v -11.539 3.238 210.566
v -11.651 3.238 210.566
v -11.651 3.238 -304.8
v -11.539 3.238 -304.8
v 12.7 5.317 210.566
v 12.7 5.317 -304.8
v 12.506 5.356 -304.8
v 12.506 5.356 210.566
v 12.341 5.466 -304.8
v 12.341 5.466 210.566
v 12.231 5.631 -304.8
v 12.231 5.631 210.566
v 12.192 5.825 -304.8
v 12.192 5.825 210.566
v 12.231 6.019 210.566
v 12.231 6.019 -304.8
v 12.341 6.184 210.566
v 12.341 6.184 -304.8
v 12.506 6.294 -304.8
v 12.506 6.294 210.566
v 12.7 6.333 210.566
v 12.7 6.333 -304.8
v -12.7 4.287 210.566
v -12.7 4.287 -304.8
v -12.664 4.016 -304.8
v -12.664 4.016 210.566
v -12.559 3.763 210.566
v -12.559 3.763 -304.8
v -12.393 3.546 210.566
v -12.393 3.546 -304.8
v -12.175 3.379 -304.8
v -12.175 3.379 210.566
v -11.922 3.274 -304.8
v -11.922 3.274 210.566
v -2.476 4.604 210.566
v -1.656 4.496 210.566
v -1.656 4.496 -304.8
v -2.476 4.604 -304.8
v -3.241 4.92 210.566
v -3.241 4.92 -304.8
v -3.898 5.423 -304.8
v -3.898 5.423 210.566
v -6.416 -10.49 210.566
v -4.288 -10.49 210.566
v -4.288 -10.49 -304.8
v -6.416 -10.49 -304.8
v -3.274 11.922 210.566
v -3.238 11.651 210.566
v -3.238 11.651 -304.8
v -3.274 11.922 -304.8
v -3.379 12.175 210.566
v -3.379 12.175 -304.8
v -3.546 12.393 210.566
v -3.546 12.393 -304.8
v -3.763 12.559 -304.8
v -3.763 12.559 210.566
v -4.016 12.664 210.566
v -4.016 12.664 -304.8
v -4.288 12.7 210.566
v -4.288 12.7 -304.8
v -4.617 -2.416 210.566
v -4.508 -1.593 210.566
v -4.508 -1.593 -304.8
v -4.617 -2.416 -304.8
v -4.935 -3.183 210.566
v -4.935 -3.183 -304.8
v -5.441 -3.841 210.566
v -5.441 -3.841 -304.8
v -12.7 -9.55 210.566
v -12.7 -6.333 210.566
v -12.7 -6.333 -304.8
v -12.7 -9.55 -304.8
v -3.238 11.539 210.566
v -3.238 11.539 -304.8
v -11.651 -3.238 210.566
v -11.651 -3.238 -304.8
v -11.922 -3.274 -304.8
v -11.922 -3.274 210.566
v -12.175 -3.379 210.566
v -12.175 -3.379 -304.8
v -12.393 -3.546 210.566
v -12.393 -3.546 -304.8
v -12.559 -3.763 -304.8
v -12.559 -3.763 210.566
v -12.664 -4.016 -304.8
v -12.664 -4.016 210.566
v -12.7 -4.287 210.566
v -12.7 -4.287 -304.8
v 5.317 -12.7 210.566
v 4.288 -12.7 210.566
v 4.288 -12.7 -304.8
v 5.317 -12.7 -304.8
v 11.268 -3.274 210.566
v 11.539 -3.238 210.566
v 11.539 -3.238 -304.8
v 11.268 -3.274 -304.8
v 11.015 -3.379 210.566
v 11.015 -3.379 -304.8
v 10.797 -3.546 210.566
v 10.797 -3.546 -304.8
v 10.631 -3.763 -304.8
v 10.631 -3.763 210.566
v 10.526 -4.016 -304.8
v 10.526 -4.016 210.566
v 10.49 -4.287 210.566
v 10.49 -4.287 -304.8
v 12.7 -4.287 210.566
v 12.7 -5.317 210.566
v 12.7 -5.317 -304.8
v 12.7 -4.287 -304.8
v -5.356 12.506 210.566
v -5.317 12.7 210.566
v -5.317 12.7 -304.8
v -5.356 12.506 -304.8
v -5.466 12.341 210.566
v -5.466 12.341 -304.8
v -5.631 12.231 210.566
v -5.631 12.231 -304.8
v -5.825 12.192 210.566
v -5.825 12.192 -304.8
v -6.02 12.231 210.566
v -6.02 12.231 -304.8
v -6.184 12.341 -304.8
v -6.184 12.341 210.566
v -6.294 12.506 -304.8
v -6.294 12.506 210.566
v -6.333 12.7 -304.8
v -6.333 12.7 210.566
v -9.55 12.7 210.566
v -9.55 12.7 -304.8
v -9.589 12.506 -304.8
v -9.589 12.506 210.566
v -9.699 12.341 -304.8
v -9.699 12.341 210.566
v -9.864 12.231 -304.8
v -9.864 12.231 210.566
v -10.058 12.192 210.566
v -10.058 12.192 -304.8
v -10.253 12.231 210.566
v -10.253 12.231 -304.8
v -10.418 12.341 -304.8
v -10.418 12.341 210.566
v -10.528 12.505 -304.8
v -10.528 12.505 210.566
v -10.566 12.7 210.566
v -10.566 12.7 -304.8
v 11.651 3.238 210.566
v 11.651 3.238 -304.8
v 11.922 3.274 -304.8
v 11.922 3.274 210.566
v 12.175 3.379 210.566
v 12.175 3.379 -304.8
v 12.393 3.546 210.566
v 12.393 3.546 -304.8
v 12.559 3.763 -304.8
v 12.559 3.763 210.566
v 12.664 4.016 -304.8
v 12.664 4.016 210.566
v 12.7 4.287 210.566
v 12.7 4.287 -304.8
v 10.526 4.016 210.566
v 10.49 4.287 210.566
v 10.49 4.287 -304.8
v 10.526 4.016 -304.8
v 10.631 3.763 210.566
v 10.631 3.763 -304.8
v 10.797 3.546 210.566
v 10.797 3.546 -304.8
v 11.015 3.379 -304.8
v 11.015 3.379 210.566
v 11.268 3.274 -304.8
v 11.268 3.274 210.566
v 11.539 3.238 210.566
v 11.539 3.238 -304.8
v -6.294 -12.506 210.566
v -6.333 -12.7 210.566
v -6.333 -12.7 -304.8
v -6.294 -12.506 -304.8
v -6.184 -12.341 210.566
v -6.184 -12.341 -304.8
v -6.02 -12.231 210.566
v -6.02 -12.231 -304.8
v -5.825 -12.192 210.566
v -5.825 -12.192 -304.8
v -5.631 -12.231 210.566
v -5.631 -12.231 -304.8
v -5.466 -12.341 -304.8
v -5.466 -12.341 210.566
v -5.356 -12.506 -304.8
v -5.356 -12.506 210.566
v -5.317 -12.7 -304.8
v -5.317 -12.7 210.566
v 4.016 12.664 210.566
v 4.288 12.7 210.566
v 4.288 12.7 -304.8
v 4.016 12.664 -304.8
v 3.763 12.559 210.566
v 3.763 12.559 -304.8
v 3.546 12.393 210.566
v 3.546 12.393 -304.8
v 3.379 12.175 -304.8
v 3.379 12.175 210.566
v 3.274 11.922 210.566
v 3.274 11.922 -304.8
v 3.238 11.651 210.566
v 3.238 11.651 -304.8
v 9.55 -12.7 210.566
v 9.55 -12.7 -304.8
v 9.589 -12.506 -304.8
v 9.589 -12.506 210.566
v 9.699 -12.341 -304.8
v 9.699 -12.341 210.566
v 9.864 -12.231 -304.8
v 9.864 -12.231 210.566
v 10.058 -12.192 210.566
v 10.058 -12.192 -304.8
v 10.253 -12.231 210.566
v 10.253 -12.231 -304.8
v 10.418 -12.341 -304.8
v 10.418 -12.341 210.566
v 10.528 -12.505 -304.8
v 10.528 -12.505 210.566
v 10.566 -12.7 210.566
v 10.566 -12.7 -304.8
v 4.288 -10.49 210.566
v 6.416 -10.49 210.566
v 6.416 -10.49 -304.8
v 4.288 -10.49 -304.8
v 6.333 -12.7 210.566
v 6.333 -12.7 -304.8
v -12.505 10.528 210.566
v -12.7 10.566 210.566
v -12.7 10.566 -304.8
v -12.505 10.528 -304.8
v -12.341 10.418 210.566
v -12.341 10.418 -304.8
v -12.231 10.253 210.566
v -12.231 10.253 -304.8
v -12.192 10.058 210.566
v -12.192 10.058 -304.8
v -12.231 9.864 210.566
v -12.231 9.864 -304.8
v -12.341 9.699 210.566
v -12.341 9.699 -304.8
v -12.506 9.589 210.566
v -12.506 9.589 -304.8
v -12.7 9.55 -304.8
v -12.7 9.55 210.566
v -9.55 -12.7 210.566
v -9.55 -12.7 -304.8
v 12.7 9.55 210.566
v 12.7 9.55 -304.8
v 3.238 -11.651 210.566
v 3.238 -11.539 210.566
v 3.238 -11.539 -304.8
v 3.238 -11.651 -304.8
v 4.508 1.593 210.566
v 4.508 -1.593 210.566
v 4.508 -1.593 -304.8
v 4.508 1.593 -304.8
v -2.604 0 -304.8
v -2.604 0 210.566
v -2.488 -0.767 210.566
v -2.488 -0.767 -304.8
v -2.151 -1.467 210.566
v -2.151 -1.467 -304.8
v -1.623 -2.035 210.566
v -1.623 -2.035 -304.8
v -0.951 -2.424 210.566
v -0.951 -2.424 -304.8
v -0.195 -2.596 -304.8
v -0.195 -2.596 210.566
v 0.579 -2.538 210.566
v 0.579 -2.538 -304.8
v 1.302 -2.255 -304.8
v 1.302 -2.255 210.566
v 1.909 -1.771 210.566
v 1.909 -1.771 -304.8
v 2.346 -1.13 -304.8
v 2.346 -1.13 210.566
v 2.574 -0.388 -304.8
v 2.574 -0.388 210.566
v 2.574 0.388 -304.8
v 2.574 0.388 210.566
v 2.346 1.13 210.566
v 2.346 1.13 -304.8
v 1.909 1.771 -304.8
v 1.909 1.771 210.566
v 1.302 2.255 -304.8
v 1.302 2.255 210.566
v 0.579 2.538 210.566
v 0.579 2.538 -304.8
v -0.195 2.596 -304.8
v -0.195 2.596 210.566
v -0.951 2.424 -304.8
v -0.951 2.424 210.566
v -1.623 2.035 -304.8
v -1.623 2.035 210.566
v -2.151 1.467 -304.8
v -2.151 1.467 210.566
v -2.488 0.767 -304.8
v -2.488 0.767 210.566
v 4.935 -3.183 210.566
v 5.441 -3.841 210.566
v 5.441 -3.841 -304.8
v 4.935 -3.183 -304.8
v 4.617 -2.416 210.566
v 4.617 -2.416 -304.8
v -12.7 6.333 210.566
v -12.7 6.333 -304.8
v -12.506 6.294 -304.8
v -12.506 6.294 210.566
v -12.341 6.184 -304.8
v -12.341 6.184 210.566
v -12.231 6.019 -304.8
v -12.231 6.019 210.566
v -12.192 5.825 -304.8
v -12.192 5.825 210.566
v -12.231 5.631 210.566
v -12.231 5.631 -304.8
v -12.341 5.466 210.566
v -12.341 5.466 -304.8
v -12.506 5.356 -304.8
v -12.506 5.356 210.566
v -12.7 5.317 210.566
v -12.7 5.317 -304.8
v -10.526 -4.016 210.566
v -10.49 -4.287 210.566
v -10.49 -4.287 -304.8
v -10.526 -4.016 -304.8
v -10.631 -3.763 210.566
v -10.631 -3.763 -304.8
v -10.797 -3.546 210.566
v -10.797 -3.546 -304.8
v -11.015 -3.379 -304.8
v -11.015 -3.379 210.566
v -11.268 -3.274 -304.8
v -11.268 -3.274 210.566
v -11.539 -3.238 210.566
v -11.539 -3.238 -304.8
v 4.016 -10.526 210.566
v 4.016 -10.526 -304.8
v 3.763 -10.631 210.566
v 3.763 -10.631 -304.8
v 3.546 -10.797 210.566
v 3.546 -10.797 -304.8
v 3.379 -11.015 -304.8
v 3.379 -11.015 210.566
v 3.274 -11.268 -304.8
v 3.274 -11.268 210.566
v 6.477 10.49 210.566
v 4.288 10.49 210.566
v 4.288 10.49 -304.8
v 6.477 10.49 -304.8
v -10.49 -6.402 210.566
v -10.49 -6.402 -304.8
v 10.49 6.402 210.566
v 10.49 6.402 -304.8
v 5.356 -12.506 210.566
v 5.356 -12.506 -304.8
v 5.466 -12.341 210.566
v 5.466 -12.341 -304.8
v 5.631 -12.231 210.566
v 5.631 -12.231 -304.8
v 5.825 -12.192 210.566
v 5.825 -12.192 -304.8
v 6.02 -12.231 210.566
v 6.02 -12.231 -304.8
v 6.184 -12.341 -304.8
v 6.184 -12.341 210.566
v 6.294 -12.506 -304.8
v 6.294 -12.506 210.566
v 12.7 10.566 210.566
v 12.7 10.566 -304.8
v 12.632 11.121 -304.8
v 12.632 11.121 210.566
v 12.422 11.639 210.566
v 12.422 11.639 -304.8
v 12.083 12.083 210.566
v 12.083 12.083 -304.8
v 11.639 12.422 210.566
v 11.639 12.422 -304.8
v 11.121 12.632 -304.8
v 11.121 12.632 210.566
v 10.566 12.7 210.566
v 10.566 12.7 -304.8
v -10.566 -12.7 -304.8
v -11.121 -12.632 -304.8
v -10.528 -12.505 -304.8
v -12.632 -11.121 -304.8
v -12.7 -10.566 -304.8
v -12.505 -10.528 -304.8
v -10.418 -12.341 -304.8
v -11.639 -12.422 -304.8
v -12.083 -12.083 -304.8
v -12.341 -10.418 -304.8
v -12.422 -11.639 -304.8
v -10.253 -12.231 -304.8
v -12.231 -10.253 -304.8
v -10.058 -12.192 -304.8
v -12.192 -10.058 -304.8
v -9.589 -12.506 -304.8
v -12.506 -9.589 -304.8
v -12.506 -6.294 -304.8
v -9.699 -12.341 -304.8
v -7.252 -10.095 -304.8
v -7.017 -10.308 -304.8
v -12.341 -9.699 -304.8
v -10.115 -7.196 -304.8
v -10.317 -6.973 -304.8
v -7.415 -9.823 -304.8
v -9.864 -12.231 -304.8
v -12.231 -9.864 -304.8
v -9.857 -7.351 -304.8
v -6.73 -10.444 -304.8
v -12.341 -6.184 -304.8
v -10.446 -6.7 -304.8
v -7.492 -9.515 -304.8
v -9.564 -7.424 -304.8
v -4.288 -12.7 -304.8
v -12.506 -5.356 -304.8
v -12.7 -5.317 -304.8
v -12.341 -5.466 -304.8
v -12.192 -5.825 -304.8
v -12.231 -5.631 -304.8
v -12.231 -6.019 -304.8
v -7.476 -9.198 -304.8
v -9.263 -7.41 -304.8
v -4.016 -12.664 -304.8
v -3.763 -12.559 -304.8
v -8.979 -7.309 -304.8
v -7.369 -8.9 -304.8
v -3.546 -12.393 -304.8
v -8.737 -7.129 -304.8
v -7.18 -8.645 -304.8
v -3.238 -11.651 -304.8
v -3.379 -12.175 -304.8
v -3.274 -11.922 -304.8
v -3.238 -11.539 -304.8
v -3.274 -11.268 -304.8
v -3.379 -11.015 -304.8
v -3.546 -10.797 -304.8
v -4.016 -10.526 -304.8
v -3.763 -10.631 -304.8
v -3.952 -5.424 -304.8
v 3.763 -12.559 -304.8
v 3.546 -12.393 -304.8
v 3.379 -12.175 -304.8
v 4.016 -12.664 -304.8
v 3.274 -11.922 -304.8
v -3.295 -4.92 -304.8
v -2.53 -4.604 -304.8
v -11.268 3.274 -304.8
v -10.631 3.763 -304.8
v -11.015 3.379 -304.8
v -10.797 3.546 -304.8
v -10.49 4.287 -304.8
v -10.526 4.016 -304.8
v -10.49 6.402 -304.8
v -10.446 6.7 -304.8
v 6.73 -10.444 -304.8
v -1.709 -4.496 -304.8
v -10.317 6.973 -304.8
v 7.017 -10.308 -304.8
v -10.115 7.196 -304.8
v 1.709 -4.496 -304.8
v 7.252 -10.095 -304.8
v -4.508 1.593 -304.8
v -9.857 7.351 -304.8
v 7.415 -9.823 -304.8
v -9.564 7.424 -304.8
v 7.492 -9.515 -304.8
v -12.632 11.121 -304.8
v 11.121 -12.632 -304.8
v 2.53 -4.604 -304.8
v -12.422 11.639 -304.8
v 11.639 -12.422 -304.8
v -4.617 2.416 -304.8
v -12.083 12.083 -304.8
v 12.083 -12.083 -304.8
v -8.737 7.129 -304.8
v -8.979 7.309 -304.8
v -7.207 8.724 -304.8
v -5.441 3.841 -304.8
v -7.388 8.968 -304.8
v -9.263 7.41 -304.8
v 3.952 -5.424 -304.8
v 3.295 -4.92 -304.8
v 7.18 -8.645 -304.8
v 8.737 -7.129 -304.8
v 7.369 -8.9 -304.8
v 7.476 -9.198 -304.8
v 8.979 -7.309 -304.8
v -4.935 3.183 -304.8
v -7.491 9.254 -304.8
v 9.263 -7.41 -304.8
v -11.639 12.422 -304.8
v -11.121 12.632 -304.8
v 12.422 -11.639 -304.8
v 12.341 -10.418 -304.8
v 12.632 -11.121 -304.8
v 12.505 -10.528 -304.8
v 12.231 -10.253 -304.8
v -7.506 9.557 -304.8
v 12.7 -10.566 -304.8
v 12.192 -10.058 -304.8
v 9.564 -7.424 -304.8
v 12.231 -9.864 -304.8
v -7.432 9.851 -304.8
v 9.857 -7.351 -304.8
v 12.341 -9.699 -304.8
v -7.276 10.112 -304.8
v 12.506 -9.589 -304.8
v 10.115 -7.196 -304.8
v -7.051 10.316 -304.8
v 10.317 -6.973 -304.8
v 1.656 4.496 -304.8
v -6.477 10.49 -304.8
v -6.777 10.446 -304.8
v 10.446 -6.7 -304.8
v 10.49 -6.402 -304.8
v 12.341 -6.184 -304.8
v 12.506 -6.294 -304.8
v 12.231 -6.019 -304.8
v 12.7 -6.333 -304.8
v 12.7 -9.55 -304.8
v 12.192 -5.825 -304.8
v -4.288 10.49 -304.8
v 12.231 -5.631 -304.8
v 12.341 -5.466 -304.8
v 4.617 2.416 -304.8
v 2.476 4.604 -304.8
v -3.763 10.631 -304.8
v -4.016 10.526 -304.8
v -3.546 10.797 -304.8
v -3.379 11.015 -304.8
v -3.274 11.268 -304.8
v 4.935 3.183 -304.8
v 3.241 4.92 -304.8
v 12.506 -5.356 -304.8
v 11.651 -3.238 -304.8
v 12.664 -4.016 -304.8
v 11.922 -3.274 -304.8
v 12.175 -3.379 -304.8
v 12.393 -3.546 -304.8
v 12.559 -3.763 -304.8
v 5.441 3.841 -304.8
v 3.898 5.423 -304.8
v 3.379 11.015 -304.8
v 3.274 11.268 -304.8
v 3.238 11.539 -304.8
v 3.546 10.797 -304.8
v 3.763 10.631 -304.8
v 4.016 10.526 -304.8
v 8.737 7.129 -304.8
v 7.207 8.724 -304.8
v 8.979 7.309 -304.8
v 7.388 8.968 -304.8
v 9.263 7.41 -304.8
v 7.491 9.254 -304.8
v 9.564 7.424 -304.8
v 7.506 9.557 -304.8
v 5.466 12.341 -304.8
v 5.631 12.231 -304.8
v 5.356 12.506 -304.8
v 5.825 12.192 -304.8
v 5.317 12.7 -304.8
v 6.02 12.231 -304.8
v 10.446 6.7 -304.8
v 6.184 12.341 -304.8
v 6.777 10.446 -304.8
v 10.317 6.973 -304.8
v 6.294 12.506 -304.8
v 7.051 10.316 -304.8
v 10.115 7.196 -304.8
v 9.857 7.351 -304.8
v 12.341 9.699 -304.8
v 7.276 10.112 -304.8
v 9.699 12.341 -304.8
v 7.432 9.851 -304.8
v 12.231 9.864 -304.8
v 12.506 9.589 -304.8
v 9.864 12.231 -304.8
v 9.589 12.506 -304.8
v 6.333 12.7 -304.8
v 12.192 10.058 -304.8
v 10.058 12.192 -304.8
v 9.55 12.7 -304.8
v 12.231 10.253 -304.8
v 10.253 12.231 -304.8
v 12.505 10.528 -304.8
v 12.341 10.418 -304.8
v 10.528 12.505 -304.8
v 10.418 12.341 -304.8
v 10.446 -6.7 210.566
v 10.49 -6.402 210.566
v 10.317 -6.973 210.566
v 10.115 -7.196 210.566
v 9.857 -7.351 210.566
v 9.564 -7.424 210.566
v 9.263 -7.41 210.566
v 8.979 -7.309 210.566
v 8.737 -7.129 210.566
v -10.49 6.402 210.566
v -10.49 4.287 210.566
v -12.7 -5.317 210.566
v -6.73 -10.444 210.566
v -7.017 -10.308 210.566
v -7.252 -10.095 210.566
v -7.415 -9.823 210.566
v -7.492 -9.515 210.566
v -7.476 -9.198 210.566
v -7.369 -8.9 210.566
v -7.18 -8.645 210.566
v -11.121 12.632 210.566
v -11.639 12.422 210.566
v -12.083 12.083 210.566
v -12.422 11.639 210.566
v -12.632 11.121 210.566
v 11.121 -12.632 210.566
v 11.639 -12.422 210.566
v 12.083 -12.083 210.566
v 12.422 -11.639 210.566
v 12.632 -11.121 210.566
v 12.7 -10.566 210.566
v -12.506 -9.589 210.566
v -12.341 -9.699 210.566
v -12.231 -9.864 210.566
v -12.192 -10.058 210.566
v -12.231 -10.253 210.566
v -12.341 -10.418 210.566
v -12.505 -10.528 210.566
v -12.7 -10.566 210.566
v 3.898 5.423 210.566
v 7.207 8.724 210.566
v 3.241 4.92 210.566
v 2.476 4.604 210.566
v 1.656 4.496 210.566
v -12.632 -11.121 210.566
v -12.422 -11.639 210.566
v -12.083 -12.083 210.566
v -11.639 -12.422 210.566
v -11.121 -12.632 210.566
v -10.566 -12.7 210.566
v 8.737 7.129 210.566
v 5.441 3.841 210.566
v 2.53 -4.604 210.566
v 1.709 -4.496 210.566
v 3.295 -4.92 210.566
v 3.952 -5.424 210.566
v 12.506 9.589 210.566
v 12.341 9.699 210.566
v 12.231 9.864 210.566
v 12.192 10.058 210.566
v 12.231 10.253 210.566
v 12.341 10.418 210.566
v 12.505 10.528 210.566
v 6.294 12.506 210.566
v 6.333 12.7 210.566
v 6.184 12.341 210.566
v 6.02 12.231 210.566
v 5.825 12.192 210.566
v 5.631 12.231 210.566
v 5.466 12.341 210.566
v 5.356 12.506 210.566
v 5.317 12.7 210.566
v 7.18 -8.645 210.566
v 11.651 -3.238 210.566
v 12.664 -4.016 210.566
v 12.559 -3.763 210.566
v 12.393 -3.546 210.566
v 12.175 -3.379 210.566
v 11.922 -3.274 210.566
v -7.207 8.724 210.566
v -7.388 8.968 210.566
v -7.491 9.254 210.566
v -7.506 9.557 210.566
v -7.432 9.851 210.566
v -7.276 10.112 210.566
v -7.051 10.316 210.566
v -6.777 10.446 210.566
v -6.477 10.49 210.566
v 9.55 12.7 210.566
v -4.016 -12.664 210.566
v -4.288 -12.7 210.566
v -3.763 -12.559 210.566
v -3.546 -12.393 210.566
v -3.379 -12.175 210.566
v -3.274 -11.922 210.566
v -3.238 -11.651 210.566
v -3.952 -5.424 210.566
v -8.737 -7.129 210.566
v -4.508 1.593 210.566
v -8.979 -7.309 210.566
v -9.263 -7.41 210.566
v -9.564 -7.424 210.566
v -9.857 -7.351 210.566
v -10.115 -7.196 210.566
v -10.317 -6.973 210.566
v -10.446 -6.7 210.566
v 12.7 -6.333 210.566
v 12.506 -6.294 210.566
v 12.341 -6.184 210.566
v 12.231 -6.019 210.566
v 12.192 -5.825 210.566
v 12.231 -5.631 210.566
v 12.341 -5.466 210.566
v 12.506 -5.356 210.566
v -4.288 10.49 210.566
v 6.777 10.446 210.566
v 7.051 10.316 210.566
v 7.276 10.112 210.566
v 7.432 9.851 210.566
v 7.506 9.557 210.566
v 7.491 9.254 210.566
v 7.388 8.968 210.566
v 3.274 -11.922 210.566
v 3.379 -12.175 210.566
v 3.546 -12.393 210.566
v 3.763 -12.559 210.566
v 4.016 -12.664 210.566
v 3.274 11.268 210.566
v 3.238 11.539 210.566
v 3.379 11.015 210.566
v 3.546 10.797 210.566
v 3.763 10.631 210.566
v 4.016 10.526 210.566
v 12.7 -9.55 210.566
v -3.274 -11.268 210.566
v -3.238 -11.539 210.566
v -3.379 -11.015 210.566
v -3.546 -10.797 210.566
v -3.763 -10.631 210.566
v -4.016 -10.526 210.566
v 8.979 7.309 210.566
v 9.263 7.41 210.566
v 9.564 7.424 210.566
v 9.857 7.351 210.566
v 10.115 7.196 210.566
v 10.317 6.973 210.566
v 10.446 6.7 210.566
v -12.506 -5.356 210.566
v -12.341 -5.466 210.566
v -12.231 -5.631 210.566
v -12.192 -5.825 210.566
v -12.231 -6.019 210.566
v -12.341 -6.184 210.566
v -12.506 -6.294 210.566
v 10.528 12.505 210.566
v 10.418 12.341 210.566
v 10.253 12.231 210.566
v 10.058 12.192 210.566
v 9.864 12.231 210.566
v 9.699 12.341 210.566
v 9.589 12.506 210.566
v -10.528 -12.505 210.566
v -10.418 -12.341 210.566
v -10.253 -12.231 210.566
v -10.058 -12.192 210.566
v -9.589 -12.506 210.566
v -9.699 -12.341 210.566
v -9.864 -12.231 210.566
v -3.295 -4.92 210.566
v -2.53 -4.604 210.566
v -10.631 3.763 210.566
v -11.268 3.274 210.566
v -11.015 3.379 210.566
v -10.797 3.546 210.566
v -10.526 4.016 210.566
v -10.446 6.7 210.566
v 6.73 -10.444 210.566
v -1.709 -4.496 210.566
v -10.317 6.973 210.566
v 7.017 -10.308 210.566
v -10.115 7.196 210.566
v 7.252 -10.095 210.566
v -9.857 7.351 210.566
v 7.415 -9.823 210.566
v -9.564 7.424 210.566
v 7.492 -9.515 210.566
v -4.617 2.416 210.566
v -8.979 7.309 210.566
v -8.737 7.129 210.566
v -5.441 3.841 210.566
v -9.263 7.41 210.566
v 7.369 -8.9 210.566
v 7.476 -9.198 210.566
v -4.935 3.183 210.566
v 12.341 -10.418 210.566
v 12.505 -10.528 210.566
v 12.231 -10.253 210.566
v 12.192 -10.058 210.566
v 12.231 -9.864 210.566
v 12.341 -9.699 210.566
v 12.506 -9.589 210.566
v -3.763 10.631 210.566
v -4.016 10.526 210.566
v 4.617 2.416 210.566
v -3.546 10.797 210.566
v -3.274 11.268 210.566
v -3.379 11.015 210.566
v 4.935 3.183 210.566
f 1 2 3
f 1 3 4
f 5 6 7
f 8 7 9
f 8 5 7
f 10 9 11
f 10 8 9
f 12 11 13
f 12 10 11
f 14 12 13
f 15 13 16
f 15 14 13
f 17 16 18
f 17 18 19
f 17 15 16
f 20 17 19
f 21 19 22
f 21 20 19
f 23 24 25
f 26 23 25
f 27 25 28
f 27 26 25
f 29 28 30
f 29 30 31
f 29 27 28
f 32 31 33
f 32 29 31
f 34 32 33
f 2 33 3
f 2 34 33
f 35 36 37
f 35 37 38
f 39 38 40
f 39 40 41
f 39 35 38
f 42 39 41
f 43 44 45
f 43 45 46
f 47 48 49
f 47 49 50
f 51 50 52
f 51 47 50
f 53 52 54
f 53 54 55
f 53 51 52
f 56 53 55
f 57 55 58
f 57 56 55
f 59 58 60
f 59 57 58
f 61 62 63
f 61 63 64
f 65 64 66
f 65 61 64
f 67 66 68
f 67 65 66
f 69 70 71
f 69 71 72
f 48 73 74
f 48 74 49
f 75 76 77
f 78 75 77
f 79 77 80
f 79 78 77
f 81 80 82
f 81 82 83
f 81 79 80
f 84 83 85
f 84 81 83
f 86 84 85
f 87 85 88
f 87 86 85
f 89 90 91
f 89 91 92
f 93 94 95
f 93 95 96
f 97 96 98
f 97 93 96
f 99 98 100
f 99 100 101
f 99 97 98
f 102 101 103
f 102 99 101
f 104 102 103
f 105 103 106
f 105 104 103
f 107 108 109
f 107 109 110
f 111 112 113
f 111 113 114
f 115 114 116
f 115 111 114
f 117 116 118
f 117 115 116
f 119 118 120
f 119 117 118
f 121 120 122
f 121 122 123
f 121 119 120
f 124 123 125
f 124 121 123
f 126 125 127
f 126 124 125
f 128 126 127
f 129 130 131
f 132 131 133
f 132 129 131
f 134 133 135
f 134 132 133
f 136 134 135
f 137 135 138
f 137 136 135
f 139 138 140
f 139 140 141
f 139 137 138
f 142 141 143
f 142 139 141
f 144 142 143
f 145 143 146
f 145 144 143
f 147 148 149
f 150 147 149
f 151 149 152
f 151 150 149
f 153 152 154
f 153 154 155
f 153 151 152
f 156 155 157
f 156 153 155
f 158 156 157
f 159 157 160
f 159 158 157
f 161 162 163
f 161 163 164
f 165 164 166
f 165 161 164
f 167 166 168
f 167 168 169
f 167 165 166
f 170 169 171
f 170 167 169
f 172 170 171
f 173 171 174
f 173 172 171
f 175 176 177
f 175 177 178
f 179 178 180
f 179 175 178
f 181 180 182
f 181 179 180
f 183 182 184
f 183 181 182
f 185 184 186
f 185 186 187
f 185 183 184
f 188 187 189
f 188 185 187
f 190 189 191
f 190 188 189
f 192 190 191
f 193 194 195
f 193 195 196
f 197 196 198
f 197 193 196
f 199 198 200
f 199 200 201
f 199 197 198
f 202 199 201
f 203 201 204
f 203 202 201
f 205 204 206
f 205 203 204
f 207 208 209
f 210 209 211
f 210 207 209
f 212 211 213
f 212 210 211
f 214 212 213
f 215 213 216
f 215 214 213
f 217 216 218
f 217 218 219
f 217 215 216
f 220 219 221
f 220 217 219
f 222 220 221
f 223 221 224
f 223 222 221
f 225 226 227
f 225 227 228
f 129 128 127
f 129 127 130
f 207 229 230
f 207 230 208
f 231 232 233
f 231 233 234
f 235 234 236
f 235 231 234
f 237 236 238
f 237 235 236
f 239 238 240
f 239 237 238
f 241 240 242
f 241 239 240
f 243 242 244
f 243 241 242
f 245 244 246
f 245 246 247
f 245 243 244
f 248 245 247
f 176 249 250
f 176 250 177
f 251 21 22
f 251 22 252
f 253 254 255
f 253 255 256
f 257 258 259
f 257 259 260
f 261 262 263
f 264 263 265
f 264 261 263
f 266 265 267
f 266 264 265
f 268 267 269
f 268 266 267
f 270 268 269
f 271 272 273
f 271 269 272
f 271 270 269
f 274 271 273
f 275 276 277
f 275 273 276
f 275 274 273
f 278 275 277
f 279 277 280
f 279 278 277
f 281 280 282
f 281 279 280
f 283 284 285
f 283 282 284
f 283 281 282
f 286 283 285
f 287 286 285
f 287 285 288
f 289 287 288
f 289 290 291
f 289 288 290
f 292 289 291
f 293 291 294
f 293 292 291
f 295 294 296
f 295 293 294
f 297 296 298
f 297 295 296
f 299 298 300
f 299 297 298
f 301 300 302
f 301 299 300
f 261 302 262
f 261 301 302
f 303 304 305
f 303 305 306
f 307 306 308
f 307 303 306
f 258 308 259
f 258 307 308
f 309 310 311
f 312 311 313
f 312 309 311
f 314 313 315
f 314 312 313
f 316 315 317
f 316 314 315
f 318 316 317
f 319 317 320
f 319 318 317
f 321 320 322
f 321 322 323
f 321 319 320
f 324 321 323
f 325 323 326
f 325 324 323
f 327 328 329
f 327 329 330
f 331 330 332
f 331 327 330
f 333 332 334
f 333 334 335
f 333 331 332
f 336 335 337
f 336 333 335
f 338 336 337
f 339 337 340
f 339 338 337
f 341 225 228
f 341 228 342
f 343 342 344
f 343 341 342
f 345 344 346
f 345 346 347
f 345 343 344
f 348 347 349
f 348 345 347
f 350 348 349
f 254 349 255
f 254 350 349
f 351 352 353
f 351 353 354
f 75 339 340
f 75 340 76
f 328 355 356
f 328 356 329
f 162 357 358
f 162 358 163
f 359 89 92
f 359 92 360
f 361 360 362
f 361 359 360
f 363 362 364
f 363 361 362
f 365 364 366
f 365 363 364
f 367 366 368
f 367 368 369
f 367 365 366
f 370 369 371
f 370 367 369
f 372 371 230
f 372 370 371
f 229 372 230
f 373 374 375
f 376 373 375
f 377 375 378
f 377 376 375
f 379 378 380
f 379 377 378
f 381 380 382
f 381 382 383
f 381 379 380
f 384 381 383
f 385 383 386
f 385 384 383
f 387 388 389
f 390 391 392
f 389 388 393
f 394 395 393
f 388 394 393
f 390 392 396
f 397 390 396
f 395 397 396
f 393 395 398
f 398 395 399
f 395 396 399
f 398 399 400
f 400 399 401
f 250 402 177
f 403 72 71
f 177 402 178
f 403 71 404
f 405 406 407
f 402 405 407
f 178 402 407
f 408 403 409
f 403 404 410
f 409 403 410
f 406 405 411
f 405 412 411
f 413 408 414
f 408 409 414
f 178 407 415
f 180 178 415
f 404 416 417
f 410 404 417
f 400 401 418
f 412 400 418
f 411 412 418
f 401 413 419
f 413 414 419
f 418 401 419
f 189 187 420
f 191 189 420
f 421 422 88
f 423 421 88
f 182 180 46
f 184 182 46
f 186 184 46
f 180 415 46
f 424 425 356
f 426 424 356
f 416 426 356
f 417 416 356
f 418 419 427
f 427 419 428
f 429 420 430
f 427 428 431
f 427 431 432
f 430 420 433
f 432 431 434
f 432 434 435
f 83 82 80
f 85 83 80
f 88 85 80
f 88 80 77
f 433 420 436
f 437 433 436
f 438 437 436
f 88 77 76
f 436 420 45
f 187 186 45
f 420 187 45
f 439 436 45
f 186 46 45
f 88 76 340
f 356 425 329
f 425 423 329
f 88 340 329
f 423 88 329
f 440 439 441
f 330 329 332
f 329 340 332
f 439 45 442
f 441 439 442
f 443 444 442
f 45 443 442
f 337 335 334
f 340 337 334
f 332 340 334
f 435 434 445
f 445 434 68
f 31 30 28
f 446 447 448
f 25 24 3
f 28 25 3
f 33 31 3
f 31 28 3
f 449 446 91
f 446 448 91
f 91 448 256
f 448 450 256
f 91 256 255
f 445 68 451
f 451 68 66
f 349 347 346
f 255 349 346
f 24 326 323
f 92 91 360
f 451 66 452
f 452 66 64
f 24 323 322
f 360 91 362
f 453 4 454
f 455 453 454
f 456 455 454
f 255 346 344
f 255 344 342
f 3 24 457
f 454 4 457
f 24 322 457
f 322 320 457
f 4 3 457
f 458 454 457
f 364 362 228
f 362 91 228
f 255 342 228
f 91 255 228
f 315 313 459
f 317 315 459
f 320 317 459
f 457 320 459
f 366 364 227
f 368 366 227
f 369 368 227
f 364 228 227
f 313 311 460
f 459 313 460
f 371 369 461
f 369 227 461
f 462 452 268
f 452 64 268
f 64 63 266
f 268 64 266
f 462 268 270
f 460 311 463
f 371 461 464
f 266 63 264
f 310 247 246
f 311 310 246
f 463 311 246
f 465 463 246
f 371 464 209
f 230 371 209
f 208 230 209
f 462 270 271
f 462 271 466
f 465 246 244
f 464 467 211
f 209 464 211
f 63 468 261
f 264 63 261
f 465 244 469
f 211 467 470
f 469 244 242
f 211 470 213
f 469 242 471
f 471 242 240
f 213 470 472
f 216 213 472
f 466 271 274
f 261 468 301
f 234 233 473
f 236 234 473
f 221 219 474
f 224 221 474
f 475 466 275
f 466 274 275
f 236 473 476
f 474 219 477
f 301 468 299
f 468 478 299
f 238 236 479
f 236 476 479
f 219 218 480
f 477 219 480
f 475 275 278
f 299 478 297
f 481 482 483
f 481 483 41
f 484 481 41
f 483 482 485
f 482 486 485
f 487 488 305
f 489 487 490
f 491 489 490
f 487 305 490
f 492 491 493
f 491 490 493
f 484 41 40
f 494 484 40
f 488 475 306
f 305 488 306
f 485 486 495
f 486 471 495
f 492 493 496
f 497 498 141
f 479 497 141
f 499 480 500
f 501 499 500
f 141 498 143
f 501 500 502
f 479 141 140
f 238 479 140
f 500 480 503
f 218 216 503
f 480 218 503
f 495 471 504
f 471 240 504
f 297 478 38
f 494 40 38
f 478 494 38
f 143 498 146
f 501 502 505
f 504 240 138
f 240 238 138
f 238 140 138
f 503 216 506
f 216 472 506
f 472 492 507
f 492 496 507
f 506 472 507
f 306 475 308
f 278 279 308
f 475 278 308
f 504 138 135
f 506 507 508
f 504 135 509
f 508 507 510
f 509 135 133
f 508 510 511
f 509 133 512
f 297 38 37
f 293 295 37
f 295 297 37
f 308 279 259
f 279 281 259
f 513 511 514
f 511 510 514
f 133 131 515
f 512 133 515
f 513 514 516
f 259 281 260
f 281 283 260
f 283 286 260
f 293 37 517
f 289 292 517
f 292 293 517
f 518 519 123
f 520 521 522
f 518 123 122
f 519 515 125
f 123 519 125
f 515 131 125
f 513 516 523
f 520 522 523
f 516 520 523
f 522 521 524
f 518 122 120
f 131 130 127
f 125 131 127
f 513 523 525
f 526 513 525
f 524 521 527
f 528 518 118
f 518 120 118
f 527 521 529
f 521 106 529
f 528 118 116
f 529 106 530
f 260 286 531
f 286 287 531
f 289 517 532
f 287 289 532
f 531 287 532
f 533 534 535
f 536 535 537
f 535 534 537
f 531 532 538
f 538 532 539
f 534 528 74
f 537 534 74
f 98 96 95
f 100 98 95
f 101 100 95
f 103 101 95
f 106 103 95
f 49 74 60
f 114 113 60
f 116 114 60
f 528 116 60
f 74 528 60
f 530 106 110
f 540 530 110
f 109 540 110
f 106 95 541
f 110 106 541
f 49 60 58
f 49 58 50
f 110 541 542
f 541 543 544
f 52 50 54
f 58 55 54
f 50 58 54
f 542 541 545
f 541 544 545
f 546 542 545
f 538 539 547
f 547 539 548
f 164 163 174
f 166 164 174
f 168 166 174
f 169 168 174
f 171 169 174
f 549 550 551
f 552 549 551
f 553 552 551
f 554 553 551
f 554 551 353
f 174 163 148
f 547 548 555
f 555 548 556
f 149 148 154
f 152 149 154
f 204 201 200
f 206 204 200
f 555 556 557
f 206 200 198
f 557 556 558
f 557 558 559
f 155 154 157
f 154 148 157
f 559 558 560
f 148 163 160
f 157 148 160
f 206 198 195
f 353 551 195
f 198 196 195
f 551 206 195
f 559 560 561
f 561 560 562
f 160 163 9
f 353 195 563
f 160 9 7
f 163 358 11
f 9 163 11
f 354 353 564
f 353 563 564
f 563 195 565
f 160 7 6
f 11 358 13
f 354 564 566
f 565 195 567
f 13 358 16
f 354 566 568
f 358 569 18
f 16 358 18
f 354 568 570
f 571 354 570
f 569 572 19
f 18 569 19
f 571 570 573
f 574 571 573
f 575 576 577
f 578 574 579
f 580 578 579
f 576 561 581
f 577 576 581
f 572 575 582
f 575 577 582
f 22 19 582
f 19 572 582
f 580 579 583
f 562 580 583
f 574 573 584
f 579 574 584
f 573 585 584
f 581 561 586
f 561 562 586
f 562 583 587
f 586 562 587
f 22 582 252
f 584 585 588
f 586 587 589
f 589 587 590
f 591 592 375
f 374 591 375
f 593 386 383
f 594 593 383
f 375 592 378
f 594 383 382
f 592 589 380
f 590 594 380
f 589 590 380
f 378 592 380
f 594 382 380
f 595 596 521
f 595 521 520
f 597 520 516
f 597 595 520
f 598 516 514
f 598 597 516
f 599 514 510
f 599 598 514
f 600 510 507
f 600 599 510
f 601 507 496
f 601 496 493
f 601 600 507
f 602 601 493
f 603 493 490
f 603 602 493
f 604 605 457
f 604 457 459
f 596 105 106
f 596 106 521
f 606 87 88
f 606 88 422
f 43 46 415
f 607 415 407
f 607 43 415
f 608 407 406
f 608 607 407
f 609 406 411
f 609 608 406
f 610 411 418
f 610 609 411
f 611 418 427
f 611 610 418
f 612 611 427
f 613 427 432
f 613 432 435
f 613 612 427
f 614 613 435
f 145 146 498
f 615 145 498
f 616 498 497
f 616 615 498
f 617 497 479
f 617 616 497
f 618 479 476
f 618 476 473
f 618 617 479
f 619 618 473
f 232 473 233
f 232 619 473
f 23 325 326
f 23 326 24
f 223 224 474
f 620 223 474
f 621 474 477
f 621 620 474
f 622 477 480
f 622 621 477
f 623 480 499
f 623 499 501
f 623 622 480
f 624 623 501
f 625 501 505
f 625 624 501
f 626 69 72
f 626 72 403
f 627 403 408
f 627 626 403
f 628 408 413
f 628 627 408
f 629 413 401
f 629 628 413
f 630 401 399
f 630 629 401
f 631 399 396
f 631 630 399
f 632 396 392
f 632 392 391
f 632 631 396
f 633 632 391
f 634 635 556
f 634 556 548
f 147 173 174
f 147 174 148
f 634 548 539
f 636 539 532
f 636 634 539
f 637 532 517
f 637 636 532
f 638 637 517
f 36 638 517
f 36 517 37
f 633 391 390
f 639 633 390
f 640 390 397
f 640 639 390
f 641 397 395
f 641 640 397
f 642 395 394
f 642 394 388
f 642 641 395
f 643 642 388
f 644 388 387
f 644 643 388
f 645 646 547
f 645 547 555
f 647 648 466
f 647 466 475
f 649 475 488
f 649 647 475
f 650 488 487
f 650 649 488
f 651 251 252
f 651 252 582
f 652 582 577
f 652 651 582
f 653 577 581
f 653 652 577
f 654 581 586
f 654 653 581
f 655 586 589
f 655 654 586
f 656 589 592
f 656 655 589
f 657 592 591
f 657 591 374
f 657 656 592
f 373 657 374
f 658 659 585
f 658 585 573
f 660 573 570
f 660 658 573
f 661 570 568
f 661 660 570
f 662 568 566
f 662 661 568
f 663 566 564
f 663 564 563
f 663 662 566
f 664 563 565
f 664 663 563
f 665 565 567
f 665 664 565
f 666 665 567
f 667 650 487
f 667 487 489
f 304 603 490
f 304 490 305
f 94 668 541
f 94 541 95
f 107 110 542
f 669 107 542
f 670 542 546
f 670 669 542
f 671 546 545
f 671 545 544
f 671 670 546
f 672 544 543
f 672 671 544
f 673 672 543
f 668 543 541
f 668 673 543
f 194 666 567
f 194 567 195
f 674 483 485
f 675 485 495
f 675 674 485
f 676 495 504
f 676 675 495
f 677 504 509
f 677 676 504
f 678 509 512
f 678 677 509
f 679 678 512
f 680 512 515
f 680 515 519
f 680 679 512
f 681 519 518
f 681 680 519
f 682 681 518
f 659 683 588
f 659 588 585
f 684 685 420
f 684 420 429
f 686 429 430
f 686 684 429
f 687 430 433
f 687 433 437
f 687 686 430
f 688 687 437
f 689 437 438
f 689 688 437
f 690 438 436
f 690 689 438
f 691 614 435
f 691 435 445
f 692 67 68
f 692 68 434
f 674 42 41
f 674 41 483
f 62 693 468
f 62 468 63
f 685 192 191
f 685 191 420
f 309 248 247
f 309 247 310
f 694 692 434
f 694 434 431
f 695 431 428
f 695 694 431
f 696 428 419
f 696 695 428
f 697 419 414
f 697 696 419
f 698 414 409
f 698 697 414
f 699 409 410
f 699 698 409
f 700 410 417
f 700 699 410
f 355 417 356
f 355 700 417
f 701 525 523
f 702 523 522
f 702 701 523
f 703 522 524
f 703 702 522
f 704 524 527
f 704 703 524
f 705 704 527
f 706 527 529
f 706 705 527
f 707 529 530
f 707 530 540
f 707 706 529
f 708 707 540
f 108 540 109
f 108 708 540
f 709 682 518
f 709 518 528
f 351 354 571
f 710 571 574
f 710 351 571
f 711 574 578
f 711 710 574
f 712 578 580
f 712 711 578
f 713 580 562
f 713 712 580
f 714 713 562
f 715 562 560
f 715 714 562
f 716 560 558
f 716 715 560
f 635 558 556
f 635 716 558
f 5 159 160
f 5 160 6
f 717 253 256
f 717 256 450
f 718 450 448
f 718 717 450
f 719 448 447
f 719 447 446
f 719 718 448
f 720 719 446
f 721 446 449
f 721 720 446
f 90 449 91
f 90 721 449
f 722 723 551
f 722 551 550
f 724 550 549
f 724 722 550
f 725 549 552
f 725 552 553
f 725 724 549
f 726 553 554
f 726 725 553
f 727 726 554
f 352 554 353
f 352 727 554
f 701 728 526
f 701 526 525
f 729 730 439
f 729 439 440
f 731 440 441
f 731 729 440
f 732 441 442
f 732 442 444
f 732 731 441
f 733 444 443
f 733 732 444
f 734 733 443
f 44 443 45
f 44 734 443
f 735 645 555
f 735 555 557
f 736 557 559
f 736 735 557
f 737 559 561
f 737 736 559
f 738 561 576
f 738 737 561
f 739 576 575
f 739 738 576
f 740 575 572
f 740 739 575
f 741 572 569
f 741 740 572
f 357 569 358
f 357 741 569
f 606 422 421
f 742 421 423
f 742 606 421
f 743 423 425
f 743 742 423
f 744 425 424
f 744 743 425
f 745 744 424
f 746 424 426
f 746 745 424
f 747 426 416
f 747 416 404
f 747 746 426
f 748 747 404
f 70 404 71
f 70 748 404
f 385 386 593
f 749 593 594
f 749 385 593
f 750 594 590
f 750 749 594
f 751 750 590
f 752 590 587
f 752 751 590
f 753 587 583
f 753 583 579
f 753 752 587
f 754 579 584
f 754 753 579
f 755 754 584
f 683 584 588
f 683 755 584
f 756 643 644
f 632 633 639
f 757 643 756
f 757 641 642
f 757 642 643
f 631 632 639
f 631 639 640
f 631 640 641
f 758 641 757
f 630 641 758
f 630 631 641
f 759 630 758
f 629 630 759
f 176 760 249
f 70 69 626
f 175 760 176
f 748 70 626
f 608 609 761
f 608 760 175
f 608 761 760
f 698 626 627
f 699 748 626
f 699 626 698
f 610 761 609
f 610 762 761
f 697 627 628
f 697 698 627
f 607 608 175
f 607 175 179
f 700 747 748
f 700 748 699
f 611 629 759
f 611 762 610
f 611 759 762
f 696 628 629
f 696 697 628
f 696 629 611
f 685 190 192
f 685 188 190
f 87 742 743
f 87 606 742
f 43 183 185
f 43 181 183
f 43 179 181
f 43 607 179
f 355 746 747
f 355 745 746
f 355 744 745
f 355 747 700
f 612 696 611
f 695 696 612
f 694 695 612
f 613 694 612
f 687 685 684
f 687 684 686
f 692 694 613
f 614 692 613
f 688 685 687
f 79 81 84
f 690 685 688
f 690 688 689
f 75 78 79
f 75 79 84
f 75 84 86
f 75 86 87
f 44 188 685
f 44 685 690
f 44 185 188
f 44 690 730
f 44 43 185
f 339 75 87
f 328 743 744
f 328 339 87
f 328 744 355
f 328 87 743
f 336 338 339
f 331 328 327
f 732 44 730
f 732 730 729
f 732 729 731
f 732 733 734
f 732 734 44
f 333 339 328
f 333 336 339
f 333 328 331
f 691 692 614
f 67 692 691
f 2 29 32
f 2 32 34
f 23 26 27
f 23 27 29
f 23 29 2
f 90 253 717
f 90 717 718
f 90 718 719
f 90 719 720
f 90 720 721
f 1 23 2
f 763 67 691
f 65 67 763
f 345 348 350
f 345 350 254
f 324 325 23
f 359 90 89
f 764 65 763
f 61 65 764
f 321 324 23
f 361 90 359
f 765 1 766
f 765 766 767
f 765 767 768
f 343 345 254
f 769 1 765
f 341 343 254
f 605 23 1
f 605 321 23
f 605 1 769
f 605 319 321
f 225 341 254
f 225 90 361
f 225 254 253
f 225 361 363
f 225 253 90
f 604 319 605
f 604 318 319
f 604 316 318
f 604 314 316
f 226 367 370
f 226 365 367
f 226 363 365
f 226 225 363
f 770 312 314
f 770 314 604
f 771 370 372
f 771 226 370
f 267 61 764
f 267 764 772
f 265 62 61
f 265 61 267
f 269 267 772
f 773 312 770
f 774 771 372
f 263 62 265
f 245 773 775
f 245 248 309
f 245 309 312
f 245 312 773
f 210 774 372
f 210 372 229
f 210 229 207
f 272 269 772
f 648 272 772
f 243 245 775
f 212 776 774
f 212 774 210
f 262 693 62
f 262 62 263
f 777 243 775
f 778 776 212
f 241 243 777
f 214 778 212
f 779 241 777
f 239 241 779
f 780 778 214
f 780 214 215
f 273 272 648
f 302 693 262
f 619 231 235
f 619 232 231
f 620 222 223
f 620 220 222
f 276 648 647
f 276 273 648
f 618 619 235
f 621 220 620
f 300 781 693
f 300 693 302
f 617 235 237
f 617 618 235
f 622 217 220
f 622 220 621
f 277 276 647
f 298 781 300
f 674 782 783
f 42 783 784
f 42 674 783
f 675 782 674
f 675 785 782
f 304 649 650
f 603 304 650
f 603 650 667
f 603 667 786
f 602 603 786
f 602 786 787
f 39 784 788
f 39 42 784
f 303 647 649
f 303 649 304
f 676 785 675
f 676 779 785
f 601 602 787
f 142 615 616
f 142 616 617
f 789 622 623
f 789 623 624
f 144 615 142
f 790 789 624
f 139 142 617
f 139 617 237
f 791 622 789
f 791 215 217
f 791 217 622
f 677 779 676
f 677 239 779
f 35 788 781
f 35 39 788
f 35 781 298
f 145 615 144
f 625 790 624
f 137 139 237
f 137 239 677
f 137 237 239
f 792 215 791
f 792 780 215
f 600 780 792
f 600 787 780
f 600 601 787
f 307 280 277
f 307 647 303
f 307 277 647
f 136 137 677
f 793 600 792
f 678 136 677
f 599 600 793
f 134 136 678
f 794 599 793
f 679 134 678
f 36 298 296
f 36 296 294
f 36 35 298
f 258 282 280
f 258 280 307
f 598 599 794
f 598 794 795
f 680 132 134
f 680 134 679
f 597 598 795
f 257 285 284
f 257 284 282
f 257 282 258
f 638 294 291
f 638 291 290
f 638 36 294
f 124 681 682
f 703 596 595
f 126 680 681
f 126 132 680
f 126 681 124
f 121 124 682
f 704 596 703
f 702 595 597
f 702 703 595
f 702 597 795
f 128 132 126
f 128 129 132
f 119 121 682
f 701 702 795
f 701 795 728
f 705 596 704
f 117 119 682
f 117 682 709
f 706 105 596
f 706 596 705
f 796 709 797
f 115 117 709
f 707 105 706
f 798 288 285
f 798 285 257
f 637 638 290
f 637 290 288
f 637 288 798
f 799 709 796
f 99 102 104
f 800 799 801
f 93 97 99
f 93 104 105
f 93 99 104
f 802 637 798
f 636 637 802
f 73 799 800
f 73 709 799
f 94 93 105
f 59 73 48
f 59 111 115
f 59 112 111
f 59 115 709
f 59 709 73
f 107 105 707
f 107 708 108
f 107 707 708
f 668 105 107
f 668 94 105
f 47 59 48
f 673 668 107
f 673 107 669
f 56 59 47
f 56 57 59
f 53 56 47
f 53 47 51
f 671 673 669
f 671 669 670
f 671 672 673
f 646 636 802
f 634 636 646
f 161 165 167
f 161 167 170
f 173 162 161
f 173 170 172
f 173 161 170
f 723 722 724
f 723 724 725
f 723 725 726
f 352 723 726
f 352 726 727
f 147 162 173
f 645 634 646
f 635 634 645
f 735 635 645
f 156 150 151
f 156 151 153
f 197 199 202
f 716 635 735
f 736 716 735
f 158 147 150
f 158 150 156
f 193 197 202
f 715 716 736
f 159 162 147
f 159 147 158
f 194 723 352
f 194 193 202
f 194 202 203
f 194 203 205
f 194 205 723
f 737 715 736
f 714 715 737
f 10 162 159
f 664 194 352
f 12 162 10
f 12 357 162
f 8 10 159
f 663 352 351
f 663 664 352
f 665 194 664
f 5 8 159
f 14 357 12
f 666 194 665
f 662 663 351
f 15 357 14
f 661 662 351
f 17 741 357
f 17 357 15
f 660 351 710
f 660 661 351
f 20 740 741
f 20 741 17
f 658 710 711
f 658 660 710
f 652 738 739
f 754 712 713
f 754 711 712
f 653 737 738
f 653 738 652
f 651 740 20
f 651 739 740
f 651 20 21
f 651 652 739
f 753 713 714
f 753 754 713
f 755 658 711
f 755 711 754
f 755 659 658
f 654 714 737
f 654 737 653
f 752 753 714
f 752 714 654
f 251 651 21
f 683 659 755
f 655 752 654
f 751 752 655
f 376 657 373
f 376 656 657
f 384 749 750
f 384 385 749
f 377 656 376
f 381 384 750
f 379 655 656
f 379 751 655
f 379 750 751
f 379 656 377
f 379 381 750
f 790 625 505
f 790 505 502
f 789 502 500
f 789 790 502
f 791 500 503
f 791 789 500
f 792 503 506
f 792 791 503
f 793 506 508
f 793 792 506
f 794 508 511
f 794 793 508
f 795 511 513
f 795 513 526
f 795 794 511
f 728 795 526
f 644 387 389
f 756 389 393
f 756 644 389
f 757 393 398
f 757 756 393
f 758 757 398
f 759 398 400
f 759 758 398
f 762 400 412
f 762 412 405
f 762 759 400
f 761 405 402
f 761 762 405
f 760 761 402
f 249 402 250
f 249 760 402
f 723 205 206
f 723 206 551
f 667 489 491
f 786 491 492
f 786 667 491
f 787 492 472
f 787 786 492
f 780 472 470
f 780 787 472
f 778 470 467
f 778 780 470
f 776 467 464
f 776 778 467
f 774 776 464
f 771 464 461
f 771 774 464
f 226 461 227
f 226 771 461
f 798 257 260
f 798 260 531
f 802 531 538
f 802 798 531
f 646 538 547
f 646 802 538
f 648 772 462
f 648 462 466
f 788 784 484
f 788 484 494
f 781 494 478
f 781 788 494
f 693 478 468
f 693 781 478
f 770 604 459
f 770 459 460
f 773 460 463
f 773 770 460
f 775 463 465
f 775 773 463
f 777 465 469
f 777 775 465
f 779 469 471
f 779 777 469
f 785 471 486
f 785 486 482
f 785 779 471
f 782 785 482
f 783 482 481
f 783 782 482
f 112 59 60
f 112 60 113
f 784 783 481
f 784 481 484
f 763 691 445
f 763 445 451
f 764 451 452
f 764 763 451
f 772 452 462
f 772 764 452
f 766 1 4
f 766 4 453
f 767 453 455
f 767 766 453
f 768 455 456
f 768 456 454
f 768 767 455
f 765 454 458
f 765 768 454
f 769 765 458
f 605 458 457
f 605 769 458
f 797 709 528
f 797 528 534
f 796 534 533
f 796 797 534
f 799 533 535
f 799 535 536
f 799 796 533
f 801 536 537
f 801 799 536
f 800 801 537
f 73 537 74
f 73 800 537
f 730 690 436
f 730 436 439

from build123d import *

# Parameters (mm, degrees)
SKETCH1_R           = 2.6035
BOSS_EXTRUDE1_DEPTH = 304.8
SKETCH2_W           = 31.141643918
SKETCH2_H           = 31.372180197
CUT_EXTRUDE1_DEPTH  = 94.234


with BuildPart() as part:
    # Sketch1 → Boss-Extrude1 (new, symmetric)
    with BuildSketch(Plane.XY):
        with BuildLine():
            Line((-7.179650497, -8.645192506), (-3.952270251, -5.423690499))
            ThreePointArc((-3.952270251, -5.423690499), (-2.922936451, -4.736929036), (-1.709253557, -4.4958))
            Line((-1.709253557, -4.4958), (1.709253557, -4.4958))
            ThreePointArc((1.709253557, -4.4958), (2.922936451, -4.736929036), (3.952270251, -5.423690499))
            Line((3.952270251, -5.423690499), (7.179650497, -8.645192506))
            ThreePointArc((7.179650497, -8.645192506), (7.41473083, -9.822813117), (6.416408329, -10.4902))
            Line((6.416408329, -10.4902), (4.287512407, -10.4902))
            ThreePointArc((4.287512407, -10.4902), (3.54574862, -10.79744862), (3.2385, -11.539212407))
            Line((3.2385, -11.539212407), (3.2385, -11.650987593))
            ThreePointArc((3.2385, -11.650987593), (3.54574862, -12.39275138), (4.287512407, -12.7))
            Line((4.287512407, -12.7), (5.317126718, -12.7))
            ThreePointArc((5.317126718, -12.7), (5.825126718, -12.192), (6.333126718, -12.7))
            Line((6.333126718, -12.7), (9.550443118, -12.7))
            ThreePointArc((9.550443118, -12.7), (10.058366869, -12.192000006), (10.566443095, -12.699847501))
            ThreePointArc((10.566443095, -12.699847501), (12.082537762, -12.08250727), (12.699846982, -10.566399977))
            ThreePointArc((12.699846982, -10.566399977), (12.192000006, -10.058323491), (12.7, -9.5504))
            Line((12.7, -9.5504), (12.7, -6.3330836))
            ThreePointArc((12.7, -6.3330836), (12.192, -5.8250836), (12.7, -5.3170836))
            Line((12.7, -5.3170836), (12.7, -4.287469289))
            ThreePointArc((12.7, -4.287469289), (12.39275138, -3.545705502), (11.650987593, -3.238456882))
            Line((11.650987593, -3.238456882), (11.539212407, -3.238456882))
            ThreePointArc((11.539212407, -3.238456882), (10.79744862, -3.545705502), (10.4902, -4.287469289))
            Line((10.4902, -4.287469289), (10.4902, -6.402089023))
            ThreePointArc((10.4902, -6.402089023), (9.856505071, -7.351067942), (8.737131347, -7.129408934))
            Line((8.737131347, -7.129408934), (5.441005833, -3.840816462))
            ThreePointArc((5.441005833, -3.840816462), (4.750877967, -2.809883091), (4.5085, -1.593185507))
            Line((4.5085, -1.593185507), (4.5085, 1.593185507))
            ThreePointArc((4.5085, 1.593185507), (4.750877967, 2.809883091), (5.441005833, 3.840816462))
            Line((5.441005833, 3.840816462), (8.737131347, 7.129408934))
            ThreePointArc((8.737131347, 7.129408934), (9.856505071, 7.351067942), (10.4902, 6.402089023))
            Line((10.4902, 6.402089023), (10.4902, 4.287469289))
            ThreePointArc((10.4902, 4.287469289), (10.79744862, 3.545705502), (11.539212407, 3.238456882))
            Line((11.539212407, 3.238456882), (11.650987593, 3.238456882))
            ThreePointArc((11.650987593, 3.238456882), (12.39275138, 3.545705502), (12.7, 4.287469289))
            Line((12.7, 4.287469289), (12.7, 5.3170836))
            ThreePointArc((12.7, 5.3170836), (12.192, 5.8250836), (12.7, 6.3330836))
            Line((12.7, 6.3330836), (12.7, 9.5504))
            ThreePointArc((12.7, 9.5504), (12.192000006, 10.058323491), (12.699846982, 10.566399977))
            ThreePointArc((12.699846982, 10.566399977), (12.082537762, 12.08250727), (10.566443095, 12.699847501))
            ThreePointArc((10.566443095, 12.699847501), (10.058366869, 12.192000006), (9.550443118, 12.7))
            Line((9.550443118, 12.7), (6.333126718, 12.7))
            ThreePointArc((6.333126718, 12.7), (5.825126718, 12.192), (5.317126718, 12.7))
            Line((5.317126718, 12.7), (4.287512407, 12.7))
            ThreePointArc((4.287512407, 12.7), (3.54574862, 12.39275138), (3.2385, 11.650987593))
            Line((3.2385, 11.650987593), (3.2385, 11.539212407))
            ThreePointArc((3.2385, 11.539212407), (3.54574862, 10.79744862), (4.287512407, 10.4902))
            Line((4.287512407, 10.4902), (6.476788598, 10.4902))
            ThreePointArc((6.476788598, 10.4902), (7.432222385, 9.85140422), (7.207036008, 8.724370562))
            Line((7.207036008, 8.724370562), (3.898272566, 5.423169045))
            ThreePointArc((3.898272566, 5.423169045), (2.869120213, 4.736787962), (1.655778399, 4.4958))
            Line((1.655778399, 4.4958), (-1.655778399, 4.4958))
            ThreePointArc((-1.655778399, 4.4958), (-2.869120213, 4.736787962), (-3.898272566, 5.423169045))
            Line((-3.898272566, 5.423169045), (-7.207036008, 8.724370562))
            ThreePointArc((-7.207036008, 8.724370562), (-7.432222385, 9.85140422), (-6.476788598, 10.4902))
            Line((-6.476788598, 10.4902), (-4.287512407, 10.4902))
            ThreePointArc((-4.287512407, 10.4902), (-3.54574862, 10.79744862), (-3.2385, 11.539212407))
            Line((-3.2385, 11.539212407), (-3.2385, 11.650987593))
            ThreePointArc((-3.2385, 11.650987593), (-3.54574862, 12.39275138), (-4.287512407, 12.7))
            Line((-4.287512407, 12.7), (-5.317126718, 12.7))
            ThreePointArc((-5.317126718, 12.7), (-5.825126718, 12.192), (-6.333126718, 12.7))
            Line((-6.333126718, 12.7), (-9.550443118, 12.7))
            ThreePointArc((-9.550443118, 12.7), (-10.058366869, 12.192000006), (-10.566443095, 12.699847501))
            ThreePointArc((-10.566443095, 12.699847501), (-12.082537762, 12.08250727), (-12.699846982, 10.566399977))
            ThreePointArc((-12.699846982, 10.566399977), (-12.192000006, 10.058323491), (-12.7, 9.5504))
            Line((-12.7, 9.5504), (-12.7, 6.3330836))
            ThreePointArc((-12.7, 6.3330836), (-12.192, 5.8250836), (-12.7, 5.3170836))
            Line((-12.7, 5.3170836), (-12.7, 4.287469289))
            ThreePointArc((-12.7, 4.287469289), (-12.39275138, 3.545705502), (-11.650987593, 3.238456882))
            Line((-11.650987593, 3.238456882), (-11.539212407, 3.238456882))
            ThreePointArc((-11.539212407, 3.238456882), (-10.79744862, 3.545705502), (-10.4902, 4.287469289))
            Line((-10.4902, 4.287469289), (-10.4902, 6.402089023))
            ThreePointArc((-10.4902, 6.402089023), (-9.856505071, 7.351067942), (-8.737131347, 7.129408934))
            Line((-8.737131347, 7.129408934), (-5.441005833, 3.840816462))
            ThreePointArc((-5.441005833, 3.840816462), (-4.750877967, 2.809883091), (-4.5085, 1.593185507))
            Line((-4.5085, 1.593185507), (-4.5085, -1.593185507))
            ThreePointArc((-4.5085, -1.593185507), (-4.750877967, -2.809883091), (-5.441005833, -3.840816462))
            Line((-5.441005833, -3.840816462), (-8.737131347, -7.129408934))
            ThreePointArc((-8.737131347, -7.129408934), (-9.856505071, -7.351067942), (-10.4902, -6.402089023))
            Line((-10.4902, -6.402089023), (-10.4902, -4.287469289))
            ThreePointArc((-10.4902, -4.287469289), (-10.79744862, -3.545705502), (-11.539212407, -3.238456882))
            Line((-11.539212407, -3.238456882), (-11.650987593, -3.238456882))
            ThreePointArc((-11.650987593, -3.238456882), (-12.39275138, -3.545705502), (-12.7, -4.287469289))
            Line((-12.7, -4.287469289), (-12.7, -5.3170836))
            ThreePointArc((-12.7, -5.3170836), (-12.192, -5.8250836), (-12.7, -6.3330836))
            Line((-12.7, -6.3330836), (-12.7, -9.5504))
            ThreePointArc((-12.7, -9.5504), (-12.192000006, -10.058323491), (-12.699846982, -10.566399977))
            ThreePointArc((-12.699846982, -10.566399977), (-12.082537762, -12.08250727), (-10.566443095, -12.699847501))
            ThreePointArc((-10.566443095, -12.699847501), (-10.058366869, -12.192000006), (-9.550443118, -12.7))
            Line((-9.550443118, -12.7), (-6.333126718, -12.7))
            ThreePointArc((-6.333126718, -12.7), (-5.825126718, -12.192), (-5.317126718, -12.7))
            Line((-5.317126718, -12.7), (-4.287512407, -12.7))
            ThreePointArc((-4.287512407, -12.7), (-3.54574862, -12.39275138), (-3.2385, -11.650987593))
            Line((-3.2385, -11.650987593), (-3.2385, -11.539212407))
            ThreePointArc((-3.2385, -11.539212407), (-3.54574862, -10.79744862), (-4.287512407, -10.4902))
            Line((-4.287512407, -10.4902), (-6.416408329, -10.4902))
            ThreePointArc((-6.416408329, -10.4902), (-7.41473083, -9.822813117), (-7.179650497, -8.645192506))
        make_face()
        with Locations(Location((0, 0, 0), (0, 0, 180))):
            Circle(SKETCH1_R, mode=Mode.SUBTRACT)
    extrude(amount=BOSS_EXTRUDE1_DEPTH, both=True)

    # Sketch2 → Cut-Extrude1 (cut)
    with BuildSketch(Plane.XY.offset(304.8)):
        with Locations((0.193871266, 0.656875365)):
            Rectangle(SKETCH2_W, SKETCH2_H)
    extrude(amount=-CUT_EXTRUDE1_DEPTH, mode=Mode.SUBTRACT)


solid = part.part
